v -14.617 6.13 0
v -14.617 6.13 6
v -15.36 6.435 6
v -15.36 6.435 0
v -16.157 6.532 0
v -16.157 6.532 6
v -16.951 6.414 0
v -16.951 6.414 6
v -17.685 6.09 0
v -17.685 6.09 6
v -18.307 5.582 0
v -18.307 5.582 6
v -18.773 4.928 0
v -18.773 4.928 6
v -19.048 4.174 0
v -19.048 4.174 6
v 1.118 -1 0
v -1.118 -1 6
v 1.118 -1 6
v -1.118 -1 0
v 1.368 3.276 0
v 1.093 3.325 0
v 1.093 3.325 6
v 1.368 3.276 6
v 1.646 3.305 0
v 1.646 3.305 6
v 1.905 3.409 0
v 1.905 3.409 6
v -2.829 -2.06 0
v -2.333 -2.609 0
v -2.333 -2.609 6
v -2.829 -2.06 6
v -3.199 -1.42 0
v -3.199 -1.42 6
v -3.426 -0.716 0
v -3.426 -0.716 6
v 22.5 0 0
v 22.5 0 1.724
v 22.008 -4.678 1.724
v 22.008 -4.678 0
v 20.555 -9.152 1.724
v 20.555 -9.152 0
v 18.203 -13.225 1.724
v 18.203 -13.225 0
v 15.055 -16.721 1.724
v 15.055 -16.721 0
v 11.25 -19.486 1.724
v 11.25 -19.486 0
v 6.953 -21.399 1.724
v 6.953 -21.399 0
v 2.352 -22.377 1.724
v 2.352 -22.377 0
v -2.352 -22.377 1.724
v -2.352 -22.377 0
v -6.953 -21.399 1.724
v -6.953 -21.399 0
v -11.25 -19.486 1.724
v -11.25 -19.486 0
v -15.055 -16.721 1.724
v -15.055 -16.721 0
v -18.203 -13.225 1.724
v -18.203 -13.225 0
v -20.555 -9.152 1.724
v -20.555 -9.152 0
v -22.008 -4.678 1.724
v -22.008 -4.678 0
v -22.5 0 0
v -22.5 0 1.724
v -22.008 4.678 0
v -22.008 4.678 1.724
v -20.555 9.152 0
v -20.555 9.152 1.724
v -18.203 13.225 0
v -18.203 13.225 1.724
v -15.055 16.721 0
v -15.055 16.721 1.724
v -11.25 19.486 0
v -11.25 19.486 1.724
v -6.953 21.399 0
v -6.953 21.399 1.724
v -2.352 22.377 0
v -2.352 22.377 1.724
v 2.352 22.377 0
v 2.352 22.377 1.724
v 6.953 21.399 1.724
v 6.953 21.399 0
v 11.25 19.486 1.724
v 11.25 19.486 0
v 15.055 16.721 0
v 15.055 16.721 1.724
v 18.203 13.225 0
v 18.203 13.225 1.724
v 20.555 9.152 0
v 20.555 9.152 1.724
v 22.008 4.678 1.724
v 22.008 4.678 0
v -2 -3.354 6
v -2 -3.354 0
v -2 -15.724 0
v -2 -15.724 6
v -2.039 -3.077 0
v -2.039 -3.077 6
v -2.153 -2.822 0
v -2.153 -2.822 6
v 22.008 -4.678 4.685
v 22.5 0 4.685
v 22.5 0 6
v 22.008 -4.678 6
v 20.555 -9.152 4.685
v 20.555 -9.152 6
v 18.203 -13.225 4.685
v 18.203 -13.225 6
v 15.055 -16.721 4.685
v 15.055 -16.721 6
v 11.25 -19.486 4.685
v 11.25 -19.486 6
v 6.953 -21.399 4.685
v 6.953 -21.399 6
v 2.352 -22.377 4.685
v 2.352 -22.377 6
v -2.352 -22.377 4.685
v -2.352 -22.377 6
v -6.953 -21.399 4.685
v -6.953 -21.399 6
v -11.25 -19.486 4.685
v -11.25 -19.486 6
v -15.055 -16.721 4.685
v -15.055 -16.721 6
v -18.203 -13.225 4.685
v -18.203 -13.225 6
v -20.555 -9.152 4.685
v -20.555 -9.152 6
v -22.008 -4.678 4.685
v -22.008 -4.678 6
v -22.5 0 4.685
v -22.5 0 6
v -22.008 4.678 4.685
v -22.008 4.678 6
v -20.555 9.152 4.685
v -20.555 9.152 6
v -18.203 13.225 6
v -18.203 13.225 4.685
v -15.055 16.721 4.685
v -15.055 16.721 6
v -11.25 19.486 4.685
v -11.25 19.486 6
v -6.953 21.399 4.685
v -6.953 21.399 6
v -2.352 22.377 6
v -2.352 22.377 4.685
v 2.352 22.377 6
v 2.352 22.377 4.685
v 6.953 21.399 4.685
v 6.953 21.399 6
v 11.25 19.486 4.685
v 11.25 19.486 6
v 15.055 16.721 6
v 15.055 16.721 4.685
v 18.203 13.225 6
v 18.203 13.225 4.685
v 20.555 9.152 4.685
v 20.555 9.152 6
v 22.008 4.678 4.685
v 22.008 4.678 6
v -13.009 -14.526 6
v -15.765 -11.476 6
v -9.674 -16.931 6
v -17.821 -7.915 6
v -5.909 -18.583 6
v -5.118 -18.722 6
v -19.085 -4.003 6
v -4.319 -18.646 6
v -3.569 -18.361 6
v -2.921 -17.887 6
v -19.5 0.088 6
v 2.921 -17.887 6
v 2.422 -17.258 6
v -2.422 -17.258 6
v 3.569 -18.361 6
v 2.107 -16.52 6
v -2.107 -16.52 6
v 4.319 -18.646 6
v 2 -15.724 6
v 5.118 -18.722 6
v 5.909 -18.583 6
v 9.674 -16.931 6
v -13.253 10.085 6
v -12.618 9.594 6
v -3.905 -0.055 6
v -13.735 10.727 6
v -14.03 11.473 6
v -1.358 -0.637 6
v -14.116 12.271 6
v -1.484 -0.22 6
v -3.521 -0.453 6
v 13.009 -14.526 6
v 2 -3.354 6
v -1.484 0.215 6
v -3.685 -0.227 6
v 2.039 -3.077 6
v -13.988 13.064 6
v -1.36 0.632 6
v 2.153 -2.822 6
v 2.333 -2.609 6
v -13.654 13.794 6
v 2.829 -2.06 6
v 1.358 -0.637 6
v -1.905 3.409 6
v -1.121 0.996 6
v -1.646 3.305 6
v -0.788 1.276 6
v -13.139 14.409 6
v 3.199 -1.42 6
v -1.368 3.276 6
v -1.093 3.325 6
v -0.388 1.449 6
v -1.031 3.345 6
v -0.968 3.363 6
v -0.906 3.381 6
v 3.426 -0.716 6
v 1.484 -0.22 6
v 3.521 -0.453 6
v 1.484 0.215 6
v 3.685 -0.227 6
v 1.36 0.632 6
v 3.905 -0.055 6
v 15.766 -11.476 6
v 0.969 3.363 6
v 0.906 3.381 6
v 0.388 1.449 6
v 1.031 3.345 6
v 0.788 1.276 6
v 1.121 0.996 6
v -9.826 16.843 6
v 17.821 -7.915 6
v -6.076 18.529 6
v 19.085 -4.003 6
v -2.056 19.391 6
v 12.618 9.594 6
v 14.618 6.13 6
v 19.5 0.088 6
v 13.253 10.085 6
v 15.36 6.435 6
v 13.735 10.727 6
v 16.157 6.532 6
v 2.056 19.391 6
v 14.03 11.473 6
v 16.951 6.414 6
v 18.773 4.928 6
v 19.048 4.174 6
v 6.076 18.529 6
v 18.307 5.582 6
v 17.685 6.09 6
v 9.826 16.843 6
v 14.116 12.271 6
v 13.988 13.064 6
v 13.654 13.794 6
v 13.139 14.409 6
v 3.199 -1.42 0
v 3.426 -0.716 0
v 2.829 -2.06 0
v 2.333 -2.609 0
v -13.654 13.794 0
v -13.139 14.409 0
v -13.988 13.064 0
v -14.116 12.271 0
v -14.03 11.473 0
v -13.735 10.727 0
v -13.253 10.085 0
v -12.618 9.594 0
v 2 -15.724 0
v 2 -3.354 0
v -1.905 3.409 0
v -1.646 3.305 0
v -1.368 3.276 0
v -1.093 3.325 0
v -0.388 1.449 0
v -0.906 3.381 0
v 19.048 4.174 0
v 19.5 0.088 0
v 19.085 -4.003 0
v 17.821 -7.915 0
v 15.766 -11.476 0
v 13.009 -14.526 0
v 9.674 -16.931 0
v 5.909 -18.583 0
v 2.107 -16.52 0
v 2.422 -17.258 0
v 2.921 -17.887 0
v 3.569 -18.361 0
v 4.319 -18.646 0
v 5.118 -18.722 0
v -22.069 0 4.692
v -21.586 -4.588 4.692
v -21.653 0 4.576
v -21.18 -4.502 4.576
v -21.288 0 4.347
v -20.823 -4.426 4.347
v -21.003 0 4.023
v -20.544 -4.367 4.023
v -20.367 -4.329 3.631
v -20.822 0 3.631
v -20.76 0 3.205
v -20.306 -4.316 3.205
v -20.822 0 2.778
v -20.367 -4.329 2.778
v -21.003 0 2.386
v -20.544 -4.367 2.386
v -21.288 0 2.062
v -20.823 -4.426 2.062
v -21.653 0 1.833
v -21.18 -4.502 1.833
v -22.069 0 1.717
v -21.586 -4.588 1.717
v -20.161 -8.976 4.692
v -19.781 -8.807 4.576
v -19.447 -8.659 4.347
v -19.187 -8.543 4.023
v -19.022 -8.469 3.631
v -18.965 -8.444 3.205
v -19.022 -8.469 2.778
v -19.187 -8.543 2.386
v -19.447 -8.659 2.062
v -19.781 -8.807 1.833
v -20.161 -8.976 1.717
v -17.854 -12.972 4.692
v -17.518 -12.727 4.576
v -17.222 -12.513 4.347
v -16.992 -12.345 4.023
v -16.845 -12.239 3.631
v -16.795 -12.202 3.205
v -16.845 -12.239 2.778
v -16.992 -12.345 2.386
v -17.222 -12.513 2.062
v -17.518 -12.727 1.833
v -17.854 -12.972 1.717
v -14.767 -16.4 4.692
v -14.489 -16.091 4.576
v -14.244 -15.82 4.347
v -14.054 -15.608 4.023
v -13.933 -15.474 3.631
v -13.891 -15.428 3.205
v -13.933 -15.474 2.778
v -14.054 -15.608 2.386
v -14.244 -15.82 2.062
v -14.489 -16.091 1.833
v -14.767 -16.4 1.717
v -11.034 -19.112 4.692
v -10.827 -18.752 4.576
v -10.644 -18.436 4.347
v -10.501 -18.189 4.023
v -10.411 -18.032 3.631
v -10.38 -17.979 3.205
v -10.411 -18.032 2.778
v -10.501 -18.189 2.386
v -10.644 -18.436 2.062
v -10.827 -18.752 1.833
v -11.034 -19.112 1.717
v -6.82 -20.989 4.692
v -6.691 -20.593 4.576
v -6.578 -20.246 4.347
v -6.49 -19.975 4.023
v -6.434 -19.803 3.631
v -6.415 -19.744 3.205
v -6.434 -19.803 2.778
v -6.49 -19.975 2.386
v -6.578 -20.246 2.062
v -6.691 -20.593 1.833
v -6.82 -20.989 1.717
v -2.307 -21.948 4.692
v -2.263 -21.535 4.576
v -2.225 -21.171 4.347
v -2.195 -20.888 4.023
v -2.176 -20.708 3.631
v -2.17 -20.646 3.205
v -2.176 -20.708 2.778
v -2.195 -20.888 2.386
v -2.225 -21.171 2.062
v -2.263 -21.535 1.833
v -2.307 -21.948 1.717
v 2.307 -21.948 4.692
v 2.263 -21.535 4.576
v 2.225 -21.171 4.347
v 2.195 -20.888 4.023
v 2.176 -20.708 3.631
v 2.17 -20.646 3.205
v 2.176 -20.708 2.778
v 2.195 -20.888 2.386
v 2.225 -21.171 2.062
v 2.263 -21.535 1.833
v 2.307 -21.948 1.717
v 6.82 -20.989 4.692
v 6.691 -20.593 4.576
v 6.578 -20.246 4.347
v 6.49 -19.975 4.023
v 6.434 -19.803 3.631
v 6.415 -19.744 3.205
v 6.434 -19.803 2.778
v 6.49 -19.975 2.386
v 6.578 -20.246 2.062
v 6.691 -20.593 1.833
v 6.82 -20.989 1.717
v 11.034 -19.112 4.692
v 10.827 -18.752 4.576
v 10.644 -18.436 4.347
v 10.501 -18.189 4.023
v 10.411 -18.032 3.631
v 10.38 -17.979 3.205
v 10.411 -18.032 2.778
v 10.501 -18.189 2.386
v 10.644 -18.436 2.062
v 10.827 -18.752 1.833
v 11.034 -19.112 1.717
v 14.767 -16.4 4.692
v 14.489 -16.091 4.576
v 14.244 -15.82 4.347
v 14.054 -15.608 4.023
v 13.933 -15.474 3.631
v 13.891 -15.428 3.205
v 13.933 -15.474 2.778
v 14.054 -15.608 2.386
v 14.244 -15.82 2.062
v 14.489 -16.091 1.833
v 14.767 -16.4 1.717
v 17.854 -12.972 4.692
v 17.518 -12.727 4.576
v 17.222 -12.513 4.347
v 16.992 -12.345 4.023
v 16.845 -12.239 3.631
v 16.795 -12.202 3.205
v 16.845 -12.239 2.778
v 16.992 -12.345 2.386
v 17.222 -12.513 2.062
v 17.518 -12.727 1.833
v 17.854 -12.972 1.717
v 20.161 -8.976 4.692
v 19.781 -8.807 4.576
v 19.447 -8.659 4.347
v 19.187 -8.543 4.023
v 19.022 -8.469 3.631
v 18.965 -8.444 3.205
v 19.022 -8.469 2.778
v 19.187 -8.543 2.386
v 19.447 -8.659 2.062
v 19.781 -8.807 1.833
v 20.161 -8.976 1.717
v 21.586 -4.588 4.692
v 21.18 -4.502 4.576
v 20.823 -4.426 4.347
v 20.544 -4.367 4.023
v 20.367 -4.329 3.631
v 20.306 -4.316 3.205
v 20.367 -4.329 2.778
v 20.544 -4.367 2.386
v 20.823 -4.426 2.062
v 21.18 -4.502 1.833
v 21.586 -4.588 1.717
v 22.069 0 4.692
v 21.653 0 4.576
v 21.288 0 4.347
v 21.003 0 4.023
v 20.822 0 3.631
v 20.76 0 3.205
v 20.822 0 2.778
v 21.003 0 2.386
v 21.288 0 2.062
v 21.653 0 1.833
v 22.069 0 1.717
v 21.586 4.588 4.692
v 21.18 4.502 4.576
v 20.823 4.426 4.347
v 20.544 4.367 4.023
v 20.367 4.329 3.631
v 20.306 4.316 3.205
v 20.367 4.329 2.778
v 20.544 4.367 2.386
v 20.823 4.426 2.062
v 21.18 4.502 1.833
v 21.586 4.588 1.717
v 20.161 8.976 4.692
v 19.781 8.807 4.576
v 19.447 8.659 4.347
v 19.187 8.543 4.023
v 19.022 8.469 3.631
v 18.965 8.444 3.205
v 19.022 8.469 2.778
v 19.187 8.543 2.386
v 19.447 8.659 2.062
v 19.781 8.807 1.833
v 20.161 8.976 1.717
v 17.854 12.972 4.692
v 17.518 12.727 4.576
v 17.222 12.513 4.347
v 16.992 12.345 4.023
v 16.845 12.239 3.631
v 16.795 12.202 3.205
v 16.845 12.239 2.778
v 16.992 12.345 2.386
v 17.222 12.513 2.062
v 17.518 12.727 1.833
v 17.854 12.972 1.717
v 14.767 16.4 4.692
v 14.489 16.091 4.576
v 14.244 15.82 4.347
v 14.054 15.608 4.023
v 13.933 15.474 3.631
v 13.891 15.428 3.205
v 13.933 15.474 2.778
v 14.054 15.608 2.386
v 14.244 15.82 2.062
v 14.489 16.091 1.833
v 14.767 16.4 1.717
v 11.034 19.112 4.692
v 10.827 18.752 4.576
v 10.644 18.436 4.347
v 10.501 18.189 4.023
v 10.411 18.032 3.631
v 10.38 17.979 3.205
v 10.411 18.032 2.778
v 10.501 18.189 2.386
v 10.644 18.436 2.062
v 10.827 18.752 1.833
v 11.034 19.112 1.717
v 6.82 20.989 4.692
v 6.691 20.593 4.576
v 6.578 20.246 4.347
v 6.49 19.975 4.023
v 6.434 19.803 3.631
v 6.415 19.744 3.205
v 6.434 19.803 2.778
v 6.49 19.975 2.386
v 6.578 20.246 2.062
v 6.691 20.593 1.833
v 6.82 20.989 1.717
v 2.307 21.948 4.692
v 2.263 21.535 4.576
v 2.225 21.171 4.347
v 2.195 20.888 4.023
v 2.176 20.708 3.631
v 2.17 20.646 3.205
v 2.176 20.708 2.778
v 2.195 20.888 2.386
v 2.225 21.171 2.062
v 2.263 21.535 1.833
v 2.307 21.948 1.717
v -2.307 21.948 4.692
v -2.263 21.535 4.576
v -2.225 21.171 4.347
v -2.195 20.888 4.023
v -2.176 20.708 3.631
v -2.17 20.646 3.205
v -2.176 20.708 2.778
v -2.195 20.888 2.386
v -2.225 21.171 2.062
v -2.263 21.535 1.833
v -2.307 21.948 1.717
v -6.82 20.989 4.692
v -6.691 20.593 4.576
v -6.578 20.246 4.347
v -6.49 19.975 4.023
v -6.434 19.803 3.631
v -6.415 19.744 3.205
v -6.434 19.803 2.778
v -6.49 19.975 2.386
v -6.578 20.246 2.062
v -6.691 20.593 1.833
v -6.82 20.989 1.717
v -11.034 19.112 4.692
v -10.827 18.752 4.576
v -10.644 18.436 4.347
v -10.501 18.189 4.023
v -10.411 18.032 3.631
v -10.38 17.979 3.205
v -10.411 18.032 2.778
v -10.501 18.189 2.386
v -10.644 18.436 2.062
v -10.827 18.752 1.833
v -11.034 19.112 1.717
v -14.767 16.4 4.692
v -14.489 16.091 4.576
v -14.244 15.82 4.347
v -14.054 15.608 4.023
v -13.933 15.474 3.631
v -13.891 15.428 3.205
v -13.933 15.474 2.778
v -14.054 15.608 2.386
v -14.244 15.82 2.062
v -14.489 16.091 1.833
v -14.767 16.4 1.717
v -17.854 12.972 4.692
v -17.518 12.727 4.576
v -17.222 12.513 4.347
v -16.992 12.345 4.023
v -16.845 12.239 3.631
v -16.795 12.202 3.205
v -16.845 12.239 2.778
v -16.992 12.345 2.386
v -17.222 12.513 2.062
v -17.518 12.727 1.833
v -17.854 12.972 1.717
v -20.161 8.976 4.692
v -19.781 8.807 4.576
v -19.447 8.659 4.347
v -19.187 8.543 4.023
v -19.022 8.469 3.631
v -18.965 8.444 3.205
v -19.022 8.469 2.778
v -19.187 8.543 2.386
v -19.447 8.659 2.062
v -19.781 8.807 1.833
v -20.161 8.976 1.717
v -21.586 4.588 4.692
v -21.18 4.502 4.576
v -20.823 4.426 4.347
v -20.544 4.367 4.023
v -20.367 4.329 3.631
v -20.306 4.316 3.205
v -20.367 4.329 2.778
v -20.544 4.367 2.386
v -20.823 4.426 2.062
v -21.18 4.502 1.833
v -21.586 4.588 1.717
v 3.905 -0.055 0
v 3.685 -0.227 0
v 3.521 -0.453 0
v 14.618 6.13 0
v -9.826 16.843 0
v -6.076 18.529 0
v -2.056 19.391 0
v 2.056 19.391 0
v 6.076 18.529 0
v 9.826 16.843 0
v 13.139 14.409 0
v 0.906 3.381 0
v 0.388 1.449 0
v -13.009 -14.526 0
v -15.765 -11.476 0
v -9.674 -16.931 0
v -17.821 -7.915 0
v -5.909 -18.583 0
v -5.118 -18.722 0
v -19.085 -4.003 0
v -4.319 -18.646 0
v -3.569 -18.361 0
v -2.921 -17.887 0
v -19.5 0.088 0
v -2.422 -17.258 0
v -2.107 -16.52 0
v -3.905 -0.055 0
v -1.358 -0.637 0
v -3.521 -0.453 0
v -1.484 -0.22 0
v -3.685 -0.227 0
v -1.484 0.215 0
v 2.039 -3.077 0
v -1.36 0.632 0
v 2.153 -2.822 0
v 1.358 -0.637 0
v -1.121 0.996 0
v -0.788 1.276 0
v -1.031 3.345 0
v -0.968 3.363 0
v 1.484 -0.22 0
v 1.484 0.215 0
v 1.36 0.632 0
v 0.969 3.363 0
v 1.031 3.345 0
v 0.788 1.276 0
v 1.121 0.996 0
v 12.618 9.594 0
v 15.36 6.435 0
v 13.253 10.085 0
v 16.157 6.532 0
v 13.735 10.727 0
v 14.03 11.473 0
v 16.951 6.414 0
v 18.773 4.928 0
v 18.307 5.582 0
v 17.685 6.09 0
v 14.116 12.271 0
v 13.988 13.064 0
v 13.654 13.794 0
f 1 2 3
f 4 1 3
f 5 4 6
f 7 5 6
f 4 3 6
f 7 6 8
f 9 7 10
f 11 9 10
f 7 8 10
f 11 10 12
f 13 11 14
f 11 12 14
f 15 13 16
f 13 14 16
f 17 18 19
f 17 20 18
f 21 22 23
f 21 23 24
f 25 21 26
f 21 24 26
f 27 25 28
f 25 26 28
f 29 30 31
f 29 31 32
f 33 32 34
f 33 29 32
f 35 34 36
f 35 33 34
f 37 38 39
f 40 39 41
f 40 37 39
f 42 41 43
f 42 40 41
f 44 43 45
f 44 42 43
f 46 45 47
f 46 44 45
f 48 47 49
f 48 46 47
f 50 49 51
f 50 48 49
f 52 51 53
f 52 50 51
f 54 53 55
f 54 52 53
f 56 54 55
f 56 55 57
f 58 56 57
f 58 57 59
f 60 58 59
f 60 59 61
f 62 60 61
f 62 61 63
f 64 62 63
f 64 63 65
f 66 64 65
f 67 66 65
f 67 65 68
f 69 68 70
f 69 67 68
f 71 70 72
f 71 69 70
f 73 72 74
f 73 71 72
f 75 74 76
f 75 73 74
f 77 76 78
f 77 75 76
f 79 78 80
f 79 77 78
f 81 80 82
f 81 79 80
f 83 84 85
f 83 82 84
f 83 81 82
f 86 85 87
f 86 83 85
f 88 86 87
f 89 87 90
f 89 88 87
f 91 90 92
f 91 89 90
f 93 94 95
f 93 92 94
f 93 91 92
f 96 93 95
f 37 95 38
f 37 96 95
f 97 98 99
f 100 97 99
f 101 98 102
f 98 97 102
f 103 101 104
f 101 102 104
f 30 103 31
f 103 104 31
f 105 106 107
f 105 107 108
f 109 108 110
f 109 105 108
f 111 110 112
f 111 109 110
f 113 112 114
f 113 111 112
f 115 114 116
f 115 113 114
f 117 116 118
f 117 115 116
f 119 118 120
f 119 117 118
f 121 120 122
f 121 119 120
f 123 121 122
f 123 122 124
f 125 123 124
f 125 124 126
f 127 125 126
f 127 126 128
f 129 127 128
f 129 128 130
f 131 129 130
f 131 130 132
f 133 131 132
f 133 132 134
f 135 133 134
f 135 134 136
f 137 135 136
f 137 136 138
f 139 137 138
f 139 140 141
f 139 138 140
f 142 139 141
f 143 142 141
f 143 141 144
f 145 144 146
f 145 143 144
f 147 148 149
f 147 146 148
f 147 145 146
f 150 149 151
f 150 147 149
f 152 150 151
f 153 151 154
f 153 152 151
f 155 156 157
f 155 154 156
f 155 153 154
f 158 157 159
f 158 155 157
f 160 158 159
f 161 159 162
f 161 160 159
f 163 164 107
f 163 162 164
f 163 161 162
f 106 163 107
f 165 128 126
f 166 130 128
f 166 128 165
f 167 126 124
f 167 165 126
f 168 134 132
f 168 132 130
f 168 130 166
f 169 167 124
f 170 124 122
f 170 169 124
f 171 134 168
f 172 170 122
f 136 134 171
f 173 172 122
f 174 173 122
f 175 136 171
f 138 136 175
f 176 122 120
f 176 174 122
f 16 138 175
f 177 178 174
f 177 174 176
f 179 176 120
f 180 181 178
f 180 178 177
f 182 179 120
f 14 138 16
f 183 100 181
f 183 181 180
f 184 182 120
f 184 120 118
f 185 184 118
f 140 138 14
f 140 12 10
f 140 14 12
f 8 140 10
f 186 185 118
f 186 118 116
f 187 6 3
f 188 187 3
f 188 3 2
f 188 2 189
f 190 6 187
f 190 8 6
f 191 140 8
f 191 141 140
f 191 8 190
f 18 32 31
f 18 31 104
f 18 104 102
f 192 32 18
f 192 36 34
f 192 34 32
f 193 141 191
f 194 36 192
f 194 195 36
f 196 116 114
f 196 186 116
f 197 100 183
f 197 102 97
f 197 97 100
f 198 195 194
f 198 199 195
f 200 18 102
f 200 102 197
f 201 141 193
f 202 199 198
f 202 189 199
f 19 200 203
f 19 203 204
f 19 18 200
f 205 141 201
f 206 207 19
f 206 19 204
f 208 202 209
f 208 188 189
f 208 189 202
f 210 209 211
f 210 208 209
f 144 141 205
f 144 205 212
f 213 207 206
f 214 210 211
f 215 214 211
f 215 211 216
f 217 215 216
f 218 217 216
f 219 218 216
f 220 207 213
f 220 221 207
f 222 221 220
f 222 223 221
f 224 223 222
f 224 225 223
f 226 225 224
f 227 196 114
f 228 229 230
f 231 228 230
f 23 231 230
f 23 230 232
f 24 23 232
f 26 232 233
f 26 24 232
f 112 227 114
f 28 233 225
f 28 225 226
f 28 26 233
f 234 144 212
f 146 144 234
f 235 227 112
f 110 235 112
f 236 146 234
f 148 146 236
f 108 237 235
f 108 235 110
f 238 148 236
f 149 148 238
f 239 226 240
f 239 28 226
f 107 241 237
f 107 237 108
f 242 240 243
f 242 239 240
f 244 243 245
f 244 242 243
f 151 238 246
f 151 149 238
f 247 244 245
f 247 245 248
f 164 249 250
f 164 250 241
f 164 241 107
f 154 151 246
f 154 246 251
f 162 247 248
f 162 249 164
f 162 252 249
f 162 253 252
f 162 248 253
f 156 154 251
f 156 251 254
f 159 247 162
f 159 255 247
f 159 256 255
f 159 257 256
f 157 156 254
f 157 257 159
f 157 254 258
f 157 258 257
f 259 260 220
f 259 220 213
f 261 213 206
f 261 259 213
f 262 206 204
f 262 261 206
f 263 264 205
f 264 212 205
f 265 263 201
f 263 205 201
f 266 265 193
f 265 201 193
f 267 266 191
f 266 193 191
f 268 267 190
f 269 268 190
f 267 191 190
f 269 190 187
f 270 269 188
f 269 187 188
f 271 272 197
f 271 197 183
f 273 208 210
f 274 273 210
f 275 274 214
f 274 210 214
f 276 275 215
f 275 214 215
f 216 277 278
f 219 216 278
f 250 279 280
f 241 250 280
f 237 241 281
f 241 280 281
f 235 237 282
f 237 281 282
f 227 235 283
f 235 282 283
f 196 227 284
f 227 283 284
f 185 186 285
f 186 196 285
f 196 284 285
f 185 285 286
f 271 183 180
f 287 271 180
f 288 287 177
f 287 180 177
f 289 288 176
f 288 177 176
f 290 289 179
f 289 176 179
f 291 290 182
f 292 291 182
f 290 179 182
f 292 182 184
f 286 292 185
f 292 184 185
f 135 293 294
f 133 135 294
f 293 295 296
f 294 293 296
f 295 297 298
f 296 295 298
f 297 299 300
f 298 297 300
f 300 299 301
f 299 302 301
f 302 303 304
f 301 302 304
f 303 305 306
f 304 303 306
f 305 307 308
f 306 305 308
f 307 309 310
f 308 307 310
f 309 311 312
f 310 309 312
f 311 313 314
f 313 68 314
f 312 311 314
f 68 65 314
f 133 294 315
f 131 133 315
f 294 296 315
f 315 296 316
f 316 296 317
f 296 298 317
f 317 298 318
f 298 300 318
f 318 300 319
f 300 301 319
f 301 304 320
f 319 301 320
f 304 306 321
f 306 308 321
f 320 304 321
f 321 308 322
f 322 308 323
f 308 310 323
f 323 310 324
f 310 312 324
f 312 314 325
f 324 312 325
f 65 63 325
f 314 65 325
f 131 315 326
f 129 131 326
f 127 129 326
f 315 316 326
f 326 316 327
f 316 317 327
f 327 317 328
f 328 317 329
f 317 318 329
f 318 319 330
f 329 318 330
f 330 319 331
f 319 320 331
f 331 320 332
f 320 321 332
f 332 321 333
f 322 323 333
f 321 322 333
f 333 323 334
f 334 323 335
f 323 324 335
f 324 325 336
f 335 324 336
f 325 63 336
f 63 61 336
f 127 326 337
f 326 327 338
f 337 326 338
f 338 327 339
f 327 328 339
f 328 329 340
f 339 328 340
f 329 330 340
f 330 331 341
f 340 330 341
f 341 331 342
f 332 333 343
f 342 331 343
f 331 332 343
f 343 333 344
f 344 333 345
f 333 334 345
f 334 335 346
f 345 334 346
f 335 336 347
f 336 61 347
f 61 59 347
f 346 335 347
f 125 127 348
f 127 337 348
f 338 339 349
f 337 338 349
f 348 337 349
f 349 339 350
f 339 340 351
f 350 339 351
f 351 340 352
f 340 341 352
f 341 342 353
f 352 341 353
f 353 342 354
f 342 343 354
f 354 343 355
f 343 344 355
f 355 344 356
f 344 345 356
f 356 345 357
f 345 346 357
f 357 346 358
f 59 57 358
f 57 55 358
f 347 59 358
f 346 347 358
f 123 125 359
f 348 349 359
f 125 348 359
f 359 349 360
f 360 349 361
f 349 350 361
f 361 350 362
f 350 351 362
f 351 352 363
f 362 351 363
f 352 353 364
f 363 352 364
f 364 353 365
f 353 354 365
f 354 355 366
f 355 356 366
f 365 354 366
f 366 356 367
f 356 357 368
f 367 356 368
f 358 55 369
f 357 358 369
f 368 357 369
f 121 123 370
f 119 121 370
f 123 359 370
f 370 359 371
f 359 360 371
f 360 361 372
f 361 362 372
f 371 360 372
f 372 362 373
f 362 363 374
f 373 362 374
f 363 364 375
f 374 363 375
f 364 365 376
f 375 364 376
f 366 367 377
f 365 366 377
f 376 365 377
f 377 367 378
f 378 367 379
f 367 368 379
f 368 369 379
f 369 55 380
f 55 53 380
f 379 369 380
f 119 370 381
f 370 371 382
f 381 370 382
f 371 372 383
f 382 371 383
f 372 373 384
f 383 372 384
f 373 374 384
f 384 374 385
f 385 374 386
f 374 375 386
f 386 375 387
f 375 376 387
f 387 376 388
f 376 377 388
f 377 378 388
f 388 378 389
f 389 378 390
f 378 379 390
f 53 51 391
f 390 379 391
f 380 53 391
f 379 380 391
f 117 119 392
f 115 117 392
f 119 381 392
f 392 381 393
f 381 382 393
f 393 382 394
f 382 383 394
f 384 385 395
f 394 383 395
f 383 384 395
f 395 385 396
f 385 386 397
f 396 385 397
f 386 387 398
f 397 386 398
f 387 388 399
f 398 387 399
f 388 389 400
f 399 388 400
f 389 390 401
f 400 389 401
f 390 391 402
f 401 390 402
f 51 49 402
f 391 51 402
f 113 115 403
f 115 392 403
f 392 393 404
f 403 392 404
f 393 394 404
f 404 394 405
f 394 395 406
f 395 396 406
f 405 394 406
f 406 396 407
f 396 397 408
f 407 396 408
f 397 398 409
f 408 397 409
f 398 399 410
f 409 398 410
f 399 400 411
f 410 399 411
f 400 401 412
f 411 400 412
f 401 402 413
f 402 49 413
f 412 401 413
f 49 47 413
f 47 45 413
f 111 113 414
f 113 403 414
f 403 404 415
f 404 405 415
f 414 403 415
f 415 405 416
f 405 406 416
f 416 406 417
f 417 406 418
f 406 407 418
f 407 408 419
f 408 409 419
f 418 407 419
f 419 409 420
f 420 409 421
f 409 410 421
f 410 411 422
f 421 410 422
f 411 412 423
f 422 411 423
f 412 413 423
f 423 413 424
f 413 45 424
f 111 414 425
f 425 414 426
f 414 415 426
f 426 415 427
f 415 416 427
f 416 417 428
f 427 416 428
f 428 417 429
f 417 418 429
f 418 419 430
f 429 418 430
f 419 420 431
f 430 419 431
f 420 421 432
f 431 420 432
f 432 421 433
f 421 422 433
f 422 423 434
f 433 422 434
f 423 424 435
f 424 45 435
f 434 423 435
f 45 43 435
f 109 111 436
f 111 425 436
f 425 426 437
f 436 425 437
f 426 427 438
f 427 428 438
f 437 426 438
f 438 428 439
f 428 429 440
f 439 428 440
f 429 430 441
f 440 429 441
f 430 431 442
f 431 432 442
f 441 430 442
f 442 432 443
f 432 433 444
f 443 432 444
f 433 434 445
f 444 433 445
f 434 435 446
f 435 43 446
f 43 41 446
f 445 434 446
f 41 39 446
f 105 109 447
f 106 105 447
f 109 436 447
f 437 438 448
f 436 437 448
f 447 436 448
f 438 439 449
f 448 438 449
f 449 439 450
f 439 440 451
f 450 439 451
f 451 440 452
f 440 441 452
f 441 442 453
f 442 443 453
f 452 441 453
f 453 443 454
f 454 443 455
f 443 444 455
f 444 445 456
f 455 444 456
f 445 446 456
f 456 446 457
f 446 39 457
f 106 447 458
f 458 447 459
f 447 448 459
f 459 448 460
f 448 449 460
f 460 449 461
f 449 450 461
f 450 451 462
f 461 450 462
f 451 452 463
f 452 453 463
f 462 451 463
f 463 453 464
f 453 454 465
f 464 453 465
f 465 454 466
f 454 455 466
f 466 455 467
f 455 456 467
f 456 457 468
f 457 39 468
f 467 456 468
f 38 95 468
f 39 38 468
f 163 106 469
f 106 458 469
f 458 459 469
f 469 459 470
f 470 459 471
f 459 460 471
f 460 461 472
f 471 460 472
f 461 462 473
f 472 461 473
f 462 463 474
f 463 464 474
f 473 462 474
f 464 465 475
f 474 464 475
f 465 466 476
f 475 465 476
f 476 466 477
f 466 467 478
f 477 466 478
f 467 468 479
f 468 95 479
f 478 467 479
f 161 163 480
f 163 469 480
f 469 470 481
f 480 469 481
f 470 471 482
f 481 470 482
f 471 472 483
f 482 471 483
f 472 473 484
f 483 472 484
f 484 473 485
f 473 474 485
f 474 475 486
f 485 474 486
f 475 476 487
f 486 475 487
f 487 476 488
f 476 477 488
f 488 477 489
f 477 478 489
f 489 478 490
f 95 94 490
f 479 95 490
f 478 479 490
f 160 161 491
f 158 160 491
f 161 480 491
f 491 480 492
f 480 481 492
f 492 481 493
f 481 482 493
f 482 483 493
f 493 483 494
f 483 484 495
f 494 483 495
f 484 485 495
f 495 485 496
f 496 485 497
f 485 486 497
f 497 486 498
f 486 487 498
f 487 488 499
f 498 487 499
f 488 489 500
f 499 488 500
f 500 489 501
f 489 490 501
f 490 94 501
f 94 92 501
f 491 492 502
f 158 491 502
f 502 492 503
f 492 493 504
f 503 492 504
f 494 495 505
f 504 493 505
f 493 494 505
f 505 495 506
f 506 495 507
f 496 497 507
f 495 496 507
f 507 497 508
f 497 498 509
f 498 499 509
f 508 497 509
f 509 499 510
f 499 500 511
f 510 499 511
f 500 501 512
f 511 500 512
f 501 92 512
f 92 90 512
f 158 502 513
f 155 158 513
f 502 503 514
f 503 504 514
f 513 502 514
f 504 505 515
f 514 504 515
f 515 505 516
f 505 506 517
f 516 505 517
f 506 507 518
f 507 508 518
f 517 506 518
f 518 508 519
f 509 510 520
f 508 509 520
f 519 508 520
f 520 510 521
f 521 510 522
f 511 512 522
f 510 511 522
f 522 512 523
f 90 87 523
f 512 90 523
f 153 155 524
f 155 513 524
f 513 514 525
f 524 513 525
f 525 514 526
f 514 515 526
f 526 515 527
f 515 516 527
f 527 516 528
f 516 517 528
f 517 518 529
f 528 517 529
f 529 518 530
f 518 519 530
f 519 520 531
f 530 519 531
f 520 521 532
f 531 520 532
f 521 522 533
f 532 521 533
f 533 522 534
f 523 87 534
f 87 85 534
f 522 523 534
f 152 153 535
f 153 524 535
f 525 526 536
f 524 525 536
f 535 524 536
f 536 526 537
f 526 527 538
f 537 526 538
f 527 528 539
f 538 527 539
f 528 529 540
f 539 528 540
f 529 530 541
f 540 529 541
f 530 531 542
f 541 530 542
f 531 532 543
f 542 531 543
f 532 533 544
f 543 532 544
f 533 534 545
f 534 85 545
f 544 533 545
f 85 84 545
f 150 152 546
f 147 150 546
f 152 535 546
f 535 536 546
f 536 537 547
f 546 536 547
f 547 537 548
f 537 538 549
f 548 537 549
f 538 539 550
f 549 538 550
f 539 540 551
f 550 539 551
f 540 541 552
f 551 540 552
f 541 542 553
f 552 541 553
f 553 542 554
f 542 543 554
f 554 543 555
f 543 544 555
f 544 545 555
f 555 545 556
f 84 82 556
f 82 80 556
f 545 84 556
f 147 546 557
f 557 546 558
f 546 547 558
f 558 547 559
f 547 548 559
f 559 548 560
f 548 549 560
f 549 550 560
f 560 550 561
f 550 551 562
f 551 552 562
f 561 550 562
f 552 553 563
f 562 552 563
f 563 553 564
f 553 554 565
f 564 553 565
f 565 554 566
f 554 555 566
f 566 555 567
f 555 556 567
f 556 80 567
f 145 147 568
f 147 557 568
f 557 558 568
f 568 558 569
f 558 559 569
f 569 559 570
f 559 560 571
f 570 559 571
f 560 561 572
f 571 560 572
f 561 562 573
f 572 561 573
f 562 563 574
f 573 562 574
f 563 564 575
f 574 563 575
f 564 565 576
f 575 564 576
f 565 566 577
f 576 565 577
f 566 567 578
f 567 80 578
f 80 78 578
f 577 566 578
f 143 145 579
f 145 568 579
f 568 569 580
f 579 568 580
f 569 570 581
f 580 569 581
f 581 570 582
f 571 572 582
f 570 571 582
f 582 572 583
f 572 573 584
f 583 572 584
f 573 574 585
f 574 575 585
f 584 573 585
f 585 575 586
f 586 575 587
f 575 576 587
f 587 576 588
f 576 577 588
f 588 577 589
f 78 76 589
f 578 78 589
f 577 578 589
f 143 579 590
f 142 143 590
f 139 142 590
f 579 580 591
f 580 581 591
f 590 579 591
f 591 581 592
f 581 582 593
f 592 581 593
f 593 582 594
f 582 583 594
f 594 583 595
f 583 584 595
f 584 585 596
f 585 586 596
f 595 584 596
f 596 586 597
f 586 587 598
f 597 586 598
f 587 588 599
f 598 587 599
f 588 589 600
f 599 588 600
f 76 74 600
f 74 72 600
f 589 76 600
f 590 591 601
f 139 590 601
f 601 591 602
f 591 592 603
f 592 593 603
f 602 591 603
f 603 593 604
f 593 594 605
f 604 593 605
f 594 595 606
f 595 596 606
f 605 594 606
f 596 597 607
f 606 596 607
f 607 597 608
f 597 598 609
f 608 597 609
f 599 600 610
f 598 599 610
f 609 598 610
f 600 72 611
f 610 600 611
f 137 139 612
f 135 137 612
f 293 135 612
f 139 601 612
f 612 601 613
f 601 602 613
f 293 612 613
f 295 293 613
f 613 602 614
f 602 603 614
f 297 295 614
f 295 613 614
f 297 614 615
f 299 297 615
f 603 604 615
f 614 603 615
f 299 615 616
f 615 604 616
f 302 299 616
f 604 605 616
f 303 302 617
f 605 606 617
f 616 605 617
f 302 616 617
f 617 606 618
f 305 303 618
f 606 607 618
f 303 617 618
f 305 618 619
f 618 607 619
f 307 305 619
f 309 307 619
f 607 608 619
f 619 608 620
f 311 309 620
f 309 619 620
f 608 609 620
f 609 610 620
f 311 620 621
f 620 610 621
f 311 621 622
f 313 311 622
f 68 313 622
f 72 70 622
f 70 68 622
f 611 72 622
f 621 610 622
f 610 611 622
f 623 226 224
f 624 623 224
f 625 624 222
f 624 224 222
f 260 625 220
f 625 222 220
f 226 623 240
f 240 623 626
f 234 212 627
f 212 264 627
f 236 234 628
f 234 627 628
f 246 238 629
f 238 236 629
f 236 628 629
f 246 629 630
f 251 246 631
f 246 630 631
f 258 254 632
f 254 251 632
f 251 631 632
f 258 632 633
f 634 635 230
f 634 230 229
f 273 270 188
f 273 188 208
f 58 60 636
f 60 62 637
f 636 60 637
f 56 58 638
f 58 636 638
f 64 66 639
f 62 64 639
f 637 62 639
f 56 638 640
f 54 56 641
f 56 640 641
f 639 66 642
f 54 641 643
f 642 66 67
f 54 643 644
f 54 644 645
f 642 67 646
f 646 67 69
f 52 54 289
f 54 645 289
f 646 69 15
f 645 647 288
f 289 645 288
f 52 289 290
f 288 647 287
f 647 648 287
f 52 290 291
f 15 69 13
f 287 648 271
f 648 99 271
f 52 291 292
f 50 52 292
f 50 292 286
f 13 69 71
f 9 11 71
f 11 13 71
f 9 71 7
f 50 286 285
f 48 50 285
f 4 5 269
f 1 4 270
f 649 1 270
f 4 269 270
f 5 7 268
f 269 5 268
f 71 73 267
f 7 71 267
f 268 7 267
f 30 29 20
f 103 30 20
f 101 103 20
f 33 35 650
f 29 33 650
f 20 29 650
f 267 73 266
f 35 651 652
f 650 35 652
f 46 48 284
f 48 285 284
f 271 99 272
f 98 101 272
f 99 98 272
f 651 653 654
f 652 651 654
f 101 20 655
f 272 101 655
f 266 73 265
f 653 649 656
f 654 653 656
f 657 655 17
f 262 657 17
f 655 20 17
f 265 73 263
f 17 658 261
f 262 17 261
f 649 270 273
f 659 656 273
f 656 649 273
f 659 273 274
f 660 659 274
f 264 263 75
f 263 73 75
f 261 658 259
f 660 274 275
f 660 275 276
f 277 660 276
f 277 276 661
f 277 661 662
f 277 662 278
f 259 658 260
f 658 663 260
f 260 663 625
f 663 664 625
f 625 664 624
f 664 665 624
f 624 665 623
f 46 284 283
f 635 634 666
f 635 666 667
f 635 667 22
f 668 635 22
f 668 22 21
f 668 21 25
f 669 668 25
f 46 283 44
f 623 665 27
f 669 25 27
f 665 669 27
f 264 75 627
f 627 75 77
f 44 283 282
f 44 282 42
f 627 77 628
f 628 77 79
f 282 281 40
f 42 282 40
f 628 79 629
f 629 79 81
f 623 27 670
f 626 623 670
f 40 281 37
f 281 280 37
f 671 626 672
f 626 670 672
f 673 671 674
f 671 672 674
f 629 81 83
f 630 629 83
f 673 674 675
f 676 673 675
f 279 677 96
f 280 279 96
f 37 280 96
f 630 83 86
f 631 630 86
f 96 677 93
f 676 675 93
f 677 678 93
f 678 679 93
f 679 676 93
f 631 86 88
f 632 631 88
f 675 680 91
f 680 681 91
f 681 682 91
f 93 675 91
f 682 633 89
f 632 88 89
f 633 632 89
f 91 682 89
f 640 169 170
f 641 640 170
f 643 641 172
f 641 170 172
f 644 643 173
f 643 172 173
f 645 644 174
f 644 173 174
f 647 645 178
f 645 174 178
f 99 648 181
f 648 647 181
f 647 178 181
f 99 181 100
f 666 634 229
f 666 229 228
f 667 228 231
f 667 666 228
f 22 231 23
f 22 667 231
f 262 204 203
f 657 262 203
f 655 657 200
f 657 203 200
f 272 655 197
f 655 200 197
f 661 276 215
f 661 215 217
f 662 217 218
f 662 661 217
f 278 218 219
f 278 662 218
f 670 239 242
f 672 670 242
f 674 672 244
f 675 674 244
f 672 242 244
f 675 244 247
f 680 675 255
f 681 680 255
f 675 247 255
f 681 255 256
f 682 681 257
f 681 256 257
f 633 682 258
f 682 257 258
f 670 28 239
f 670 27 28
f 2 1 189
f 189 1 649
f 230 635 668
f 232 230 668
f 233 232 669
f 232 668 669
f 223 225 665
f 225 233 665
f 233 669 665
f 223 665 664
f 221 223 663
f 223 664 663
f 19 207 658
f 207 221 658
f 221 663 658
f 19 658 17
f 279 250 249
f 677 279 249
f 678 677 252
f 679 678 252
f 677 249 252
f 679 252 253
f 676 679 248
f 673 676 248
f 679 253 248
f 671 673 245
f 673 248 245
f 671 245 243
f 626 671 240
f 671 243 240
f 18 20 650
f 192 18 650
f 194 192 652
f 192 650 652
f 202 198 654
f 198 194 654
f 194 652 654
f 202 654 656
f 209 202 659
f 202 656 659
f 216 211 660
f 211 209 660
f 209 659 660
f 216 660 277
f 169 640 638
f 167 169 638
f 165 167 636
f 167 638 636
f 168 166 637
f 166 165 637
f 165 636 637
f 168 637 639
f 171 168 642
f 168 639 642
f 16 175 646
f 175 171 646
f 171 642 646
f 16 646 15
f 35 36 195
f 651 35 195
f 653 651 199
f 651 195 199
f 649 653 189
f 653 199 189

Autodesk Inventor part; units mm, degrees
ref_plane "XY Plane" through (0, 0, 0) normal (0, 0, 1) x (1, 0, 0)
sketch "Sketch1" plane through (0, 0, 0) normal (0, 0, 1) x (1, 0, 0)
  line L0 (-19.5, 0) -> (19.5, 0) construction
  line L1 (-1.118, -1) -> (1.118, -1)
  line L2 (0, -3.5) -> (0, -10.5) construction
  line L3 (0, 31.6864) -> (0, -32.6182) construction
  line L4 (2, -2.8723) -> (2, -19.3972)
  line L5 (-2, -2.8723) -> (-2, -19.3972)
  line L6 (3.0311, 1.75) -> (9.0933, 5.25) construction
  line L7 (-3.0311, 1.75) -> (-9.0933, 5.25) construction
  line L8 (3.4875, -0.2959) -> (17.7984, 7.9665)
  line L9 (1.4875, 3.1682) -> (15.7984, 11.4306)
  arc A0 (2, -19.3972) -> (17.7984, 7.9665) centre (0, 0) ccw
  line L10 (-15.7984, 11.4306) -> (-1.4875, 3.1682)
  line L11 (-17.7984, 7.9665) -> (-3.4875, -0.2959)
  arc A1 (15.7984, 11.4306) -> (-15.7984, 11.4306) centre (0, 0) ccw
  arc A2 (-17.7984, 7.9665) -> (-2, -19.3972) centre (0, 0) ccw
  arc A3 (-3.4875, -0.2959) -> (-2, -2.8723) centre (0, 0) ccw
  arc A4 (2, -2.8723) -> (3.4875, -0.2959) centre (0, 0) ccw
  line L12 (0, 0) -> (2.0417, 7.6198) construction
  line L13 (0, 0) -> (-1.8775, 7.0067) construction
  line L14 (0.3882, 1.4489) -> (0.9059, 3.3807)
  line L15 (-0.3882, 1.4489) -> (-0.9059, 3.3807)
  arc A5 (1.4875, 3.1682) -> (0.9059, 3.3807) centre (0, 0) ccw
  arc A6 (-0.9059, 3.3807) -> (-1.4875, 3.1682) centre (0, 0) ccw
  arc A7 (1.118, -1) -> (0.3882, 1.4489) centre (0, 0) ccw
  arc A8 (-0.3882, 1.4489) -> (-1.118, -1) centre (0, 0) ccw
  circle A9 centre (0, 0) radius 22.5
  dimension "d3" = 1
  dimension "d4" = 2
  dimension "d5" = 2
  dimension "d8" = 360
  dimension "d10" = 2
  dimension "d11" = 2
  dimension "d12" = 2
  dimension "d13" = 2
  dimension "d17" = 3.5
  dimension "d18" = 3.5
  dimension "d19" = 15
  dimension "d20" = 15
  dimension "d21" = 3.5
  dimension "d22" = 3.5
  dimension "d23" = 1.5
  dimension "d24" = 1.5
  dimension "d25" = 45
  dimension "d81" = 3
  dimension "d84" = 3
  dimension "d85" = 3
extrude "Extrusion1" add sketch "Sketch1" along normal blind 6
fillet "Fillet10" radius 1 6 edges at (3.4875, -0.2959, 3) (2, -2.8723, 3) (-3.4875, -0.2959, 3) (-2, -2.8723, 3) (-1.4875, 3.1682, 3) (1.4875, 3.1682, 3)
fillet "Fillet11" radius 3 6 edges at (-17.7984, 7.9665, 3) (-15.7984, 11.4306, 3) (15.7984, 11.4306, 3) (17.7984, 7.9665, 3) (2, -19.3972, 3) (-2, -19.3972, 3)
sketch "Sketch4" plane through (0, 0, 0) normal (0, 1, 0) x (-1, 0, 0)
  circle A0 centre (22.26, 3.2046) radius 1.5
  line L0 (0, 7.6708) -> (0, -6.5685) construction
  line L1 (22.4632, 5.9906) -> (22.4632, 0) construction
  point P0 (0, 0)
  dimension "d77" = 3
revolve "Revolution2" cut sketch "Sketch4" angle 360 about axis through (0, 0, 7.6708) along (0, 0, -1)
equation "\"d5\" = d4"
equation "\"d11\" = d10"
equation "\"d12\" = d10"
equation "\"d13\" = d10"
equation "\"d18\" = d17"
equation "\"d20\" = d19"
equation "\"d21\" = d17"
equation "\"d22\" = d17"
equation "\"d24\" = d23"
properties part number "Rueda1"
